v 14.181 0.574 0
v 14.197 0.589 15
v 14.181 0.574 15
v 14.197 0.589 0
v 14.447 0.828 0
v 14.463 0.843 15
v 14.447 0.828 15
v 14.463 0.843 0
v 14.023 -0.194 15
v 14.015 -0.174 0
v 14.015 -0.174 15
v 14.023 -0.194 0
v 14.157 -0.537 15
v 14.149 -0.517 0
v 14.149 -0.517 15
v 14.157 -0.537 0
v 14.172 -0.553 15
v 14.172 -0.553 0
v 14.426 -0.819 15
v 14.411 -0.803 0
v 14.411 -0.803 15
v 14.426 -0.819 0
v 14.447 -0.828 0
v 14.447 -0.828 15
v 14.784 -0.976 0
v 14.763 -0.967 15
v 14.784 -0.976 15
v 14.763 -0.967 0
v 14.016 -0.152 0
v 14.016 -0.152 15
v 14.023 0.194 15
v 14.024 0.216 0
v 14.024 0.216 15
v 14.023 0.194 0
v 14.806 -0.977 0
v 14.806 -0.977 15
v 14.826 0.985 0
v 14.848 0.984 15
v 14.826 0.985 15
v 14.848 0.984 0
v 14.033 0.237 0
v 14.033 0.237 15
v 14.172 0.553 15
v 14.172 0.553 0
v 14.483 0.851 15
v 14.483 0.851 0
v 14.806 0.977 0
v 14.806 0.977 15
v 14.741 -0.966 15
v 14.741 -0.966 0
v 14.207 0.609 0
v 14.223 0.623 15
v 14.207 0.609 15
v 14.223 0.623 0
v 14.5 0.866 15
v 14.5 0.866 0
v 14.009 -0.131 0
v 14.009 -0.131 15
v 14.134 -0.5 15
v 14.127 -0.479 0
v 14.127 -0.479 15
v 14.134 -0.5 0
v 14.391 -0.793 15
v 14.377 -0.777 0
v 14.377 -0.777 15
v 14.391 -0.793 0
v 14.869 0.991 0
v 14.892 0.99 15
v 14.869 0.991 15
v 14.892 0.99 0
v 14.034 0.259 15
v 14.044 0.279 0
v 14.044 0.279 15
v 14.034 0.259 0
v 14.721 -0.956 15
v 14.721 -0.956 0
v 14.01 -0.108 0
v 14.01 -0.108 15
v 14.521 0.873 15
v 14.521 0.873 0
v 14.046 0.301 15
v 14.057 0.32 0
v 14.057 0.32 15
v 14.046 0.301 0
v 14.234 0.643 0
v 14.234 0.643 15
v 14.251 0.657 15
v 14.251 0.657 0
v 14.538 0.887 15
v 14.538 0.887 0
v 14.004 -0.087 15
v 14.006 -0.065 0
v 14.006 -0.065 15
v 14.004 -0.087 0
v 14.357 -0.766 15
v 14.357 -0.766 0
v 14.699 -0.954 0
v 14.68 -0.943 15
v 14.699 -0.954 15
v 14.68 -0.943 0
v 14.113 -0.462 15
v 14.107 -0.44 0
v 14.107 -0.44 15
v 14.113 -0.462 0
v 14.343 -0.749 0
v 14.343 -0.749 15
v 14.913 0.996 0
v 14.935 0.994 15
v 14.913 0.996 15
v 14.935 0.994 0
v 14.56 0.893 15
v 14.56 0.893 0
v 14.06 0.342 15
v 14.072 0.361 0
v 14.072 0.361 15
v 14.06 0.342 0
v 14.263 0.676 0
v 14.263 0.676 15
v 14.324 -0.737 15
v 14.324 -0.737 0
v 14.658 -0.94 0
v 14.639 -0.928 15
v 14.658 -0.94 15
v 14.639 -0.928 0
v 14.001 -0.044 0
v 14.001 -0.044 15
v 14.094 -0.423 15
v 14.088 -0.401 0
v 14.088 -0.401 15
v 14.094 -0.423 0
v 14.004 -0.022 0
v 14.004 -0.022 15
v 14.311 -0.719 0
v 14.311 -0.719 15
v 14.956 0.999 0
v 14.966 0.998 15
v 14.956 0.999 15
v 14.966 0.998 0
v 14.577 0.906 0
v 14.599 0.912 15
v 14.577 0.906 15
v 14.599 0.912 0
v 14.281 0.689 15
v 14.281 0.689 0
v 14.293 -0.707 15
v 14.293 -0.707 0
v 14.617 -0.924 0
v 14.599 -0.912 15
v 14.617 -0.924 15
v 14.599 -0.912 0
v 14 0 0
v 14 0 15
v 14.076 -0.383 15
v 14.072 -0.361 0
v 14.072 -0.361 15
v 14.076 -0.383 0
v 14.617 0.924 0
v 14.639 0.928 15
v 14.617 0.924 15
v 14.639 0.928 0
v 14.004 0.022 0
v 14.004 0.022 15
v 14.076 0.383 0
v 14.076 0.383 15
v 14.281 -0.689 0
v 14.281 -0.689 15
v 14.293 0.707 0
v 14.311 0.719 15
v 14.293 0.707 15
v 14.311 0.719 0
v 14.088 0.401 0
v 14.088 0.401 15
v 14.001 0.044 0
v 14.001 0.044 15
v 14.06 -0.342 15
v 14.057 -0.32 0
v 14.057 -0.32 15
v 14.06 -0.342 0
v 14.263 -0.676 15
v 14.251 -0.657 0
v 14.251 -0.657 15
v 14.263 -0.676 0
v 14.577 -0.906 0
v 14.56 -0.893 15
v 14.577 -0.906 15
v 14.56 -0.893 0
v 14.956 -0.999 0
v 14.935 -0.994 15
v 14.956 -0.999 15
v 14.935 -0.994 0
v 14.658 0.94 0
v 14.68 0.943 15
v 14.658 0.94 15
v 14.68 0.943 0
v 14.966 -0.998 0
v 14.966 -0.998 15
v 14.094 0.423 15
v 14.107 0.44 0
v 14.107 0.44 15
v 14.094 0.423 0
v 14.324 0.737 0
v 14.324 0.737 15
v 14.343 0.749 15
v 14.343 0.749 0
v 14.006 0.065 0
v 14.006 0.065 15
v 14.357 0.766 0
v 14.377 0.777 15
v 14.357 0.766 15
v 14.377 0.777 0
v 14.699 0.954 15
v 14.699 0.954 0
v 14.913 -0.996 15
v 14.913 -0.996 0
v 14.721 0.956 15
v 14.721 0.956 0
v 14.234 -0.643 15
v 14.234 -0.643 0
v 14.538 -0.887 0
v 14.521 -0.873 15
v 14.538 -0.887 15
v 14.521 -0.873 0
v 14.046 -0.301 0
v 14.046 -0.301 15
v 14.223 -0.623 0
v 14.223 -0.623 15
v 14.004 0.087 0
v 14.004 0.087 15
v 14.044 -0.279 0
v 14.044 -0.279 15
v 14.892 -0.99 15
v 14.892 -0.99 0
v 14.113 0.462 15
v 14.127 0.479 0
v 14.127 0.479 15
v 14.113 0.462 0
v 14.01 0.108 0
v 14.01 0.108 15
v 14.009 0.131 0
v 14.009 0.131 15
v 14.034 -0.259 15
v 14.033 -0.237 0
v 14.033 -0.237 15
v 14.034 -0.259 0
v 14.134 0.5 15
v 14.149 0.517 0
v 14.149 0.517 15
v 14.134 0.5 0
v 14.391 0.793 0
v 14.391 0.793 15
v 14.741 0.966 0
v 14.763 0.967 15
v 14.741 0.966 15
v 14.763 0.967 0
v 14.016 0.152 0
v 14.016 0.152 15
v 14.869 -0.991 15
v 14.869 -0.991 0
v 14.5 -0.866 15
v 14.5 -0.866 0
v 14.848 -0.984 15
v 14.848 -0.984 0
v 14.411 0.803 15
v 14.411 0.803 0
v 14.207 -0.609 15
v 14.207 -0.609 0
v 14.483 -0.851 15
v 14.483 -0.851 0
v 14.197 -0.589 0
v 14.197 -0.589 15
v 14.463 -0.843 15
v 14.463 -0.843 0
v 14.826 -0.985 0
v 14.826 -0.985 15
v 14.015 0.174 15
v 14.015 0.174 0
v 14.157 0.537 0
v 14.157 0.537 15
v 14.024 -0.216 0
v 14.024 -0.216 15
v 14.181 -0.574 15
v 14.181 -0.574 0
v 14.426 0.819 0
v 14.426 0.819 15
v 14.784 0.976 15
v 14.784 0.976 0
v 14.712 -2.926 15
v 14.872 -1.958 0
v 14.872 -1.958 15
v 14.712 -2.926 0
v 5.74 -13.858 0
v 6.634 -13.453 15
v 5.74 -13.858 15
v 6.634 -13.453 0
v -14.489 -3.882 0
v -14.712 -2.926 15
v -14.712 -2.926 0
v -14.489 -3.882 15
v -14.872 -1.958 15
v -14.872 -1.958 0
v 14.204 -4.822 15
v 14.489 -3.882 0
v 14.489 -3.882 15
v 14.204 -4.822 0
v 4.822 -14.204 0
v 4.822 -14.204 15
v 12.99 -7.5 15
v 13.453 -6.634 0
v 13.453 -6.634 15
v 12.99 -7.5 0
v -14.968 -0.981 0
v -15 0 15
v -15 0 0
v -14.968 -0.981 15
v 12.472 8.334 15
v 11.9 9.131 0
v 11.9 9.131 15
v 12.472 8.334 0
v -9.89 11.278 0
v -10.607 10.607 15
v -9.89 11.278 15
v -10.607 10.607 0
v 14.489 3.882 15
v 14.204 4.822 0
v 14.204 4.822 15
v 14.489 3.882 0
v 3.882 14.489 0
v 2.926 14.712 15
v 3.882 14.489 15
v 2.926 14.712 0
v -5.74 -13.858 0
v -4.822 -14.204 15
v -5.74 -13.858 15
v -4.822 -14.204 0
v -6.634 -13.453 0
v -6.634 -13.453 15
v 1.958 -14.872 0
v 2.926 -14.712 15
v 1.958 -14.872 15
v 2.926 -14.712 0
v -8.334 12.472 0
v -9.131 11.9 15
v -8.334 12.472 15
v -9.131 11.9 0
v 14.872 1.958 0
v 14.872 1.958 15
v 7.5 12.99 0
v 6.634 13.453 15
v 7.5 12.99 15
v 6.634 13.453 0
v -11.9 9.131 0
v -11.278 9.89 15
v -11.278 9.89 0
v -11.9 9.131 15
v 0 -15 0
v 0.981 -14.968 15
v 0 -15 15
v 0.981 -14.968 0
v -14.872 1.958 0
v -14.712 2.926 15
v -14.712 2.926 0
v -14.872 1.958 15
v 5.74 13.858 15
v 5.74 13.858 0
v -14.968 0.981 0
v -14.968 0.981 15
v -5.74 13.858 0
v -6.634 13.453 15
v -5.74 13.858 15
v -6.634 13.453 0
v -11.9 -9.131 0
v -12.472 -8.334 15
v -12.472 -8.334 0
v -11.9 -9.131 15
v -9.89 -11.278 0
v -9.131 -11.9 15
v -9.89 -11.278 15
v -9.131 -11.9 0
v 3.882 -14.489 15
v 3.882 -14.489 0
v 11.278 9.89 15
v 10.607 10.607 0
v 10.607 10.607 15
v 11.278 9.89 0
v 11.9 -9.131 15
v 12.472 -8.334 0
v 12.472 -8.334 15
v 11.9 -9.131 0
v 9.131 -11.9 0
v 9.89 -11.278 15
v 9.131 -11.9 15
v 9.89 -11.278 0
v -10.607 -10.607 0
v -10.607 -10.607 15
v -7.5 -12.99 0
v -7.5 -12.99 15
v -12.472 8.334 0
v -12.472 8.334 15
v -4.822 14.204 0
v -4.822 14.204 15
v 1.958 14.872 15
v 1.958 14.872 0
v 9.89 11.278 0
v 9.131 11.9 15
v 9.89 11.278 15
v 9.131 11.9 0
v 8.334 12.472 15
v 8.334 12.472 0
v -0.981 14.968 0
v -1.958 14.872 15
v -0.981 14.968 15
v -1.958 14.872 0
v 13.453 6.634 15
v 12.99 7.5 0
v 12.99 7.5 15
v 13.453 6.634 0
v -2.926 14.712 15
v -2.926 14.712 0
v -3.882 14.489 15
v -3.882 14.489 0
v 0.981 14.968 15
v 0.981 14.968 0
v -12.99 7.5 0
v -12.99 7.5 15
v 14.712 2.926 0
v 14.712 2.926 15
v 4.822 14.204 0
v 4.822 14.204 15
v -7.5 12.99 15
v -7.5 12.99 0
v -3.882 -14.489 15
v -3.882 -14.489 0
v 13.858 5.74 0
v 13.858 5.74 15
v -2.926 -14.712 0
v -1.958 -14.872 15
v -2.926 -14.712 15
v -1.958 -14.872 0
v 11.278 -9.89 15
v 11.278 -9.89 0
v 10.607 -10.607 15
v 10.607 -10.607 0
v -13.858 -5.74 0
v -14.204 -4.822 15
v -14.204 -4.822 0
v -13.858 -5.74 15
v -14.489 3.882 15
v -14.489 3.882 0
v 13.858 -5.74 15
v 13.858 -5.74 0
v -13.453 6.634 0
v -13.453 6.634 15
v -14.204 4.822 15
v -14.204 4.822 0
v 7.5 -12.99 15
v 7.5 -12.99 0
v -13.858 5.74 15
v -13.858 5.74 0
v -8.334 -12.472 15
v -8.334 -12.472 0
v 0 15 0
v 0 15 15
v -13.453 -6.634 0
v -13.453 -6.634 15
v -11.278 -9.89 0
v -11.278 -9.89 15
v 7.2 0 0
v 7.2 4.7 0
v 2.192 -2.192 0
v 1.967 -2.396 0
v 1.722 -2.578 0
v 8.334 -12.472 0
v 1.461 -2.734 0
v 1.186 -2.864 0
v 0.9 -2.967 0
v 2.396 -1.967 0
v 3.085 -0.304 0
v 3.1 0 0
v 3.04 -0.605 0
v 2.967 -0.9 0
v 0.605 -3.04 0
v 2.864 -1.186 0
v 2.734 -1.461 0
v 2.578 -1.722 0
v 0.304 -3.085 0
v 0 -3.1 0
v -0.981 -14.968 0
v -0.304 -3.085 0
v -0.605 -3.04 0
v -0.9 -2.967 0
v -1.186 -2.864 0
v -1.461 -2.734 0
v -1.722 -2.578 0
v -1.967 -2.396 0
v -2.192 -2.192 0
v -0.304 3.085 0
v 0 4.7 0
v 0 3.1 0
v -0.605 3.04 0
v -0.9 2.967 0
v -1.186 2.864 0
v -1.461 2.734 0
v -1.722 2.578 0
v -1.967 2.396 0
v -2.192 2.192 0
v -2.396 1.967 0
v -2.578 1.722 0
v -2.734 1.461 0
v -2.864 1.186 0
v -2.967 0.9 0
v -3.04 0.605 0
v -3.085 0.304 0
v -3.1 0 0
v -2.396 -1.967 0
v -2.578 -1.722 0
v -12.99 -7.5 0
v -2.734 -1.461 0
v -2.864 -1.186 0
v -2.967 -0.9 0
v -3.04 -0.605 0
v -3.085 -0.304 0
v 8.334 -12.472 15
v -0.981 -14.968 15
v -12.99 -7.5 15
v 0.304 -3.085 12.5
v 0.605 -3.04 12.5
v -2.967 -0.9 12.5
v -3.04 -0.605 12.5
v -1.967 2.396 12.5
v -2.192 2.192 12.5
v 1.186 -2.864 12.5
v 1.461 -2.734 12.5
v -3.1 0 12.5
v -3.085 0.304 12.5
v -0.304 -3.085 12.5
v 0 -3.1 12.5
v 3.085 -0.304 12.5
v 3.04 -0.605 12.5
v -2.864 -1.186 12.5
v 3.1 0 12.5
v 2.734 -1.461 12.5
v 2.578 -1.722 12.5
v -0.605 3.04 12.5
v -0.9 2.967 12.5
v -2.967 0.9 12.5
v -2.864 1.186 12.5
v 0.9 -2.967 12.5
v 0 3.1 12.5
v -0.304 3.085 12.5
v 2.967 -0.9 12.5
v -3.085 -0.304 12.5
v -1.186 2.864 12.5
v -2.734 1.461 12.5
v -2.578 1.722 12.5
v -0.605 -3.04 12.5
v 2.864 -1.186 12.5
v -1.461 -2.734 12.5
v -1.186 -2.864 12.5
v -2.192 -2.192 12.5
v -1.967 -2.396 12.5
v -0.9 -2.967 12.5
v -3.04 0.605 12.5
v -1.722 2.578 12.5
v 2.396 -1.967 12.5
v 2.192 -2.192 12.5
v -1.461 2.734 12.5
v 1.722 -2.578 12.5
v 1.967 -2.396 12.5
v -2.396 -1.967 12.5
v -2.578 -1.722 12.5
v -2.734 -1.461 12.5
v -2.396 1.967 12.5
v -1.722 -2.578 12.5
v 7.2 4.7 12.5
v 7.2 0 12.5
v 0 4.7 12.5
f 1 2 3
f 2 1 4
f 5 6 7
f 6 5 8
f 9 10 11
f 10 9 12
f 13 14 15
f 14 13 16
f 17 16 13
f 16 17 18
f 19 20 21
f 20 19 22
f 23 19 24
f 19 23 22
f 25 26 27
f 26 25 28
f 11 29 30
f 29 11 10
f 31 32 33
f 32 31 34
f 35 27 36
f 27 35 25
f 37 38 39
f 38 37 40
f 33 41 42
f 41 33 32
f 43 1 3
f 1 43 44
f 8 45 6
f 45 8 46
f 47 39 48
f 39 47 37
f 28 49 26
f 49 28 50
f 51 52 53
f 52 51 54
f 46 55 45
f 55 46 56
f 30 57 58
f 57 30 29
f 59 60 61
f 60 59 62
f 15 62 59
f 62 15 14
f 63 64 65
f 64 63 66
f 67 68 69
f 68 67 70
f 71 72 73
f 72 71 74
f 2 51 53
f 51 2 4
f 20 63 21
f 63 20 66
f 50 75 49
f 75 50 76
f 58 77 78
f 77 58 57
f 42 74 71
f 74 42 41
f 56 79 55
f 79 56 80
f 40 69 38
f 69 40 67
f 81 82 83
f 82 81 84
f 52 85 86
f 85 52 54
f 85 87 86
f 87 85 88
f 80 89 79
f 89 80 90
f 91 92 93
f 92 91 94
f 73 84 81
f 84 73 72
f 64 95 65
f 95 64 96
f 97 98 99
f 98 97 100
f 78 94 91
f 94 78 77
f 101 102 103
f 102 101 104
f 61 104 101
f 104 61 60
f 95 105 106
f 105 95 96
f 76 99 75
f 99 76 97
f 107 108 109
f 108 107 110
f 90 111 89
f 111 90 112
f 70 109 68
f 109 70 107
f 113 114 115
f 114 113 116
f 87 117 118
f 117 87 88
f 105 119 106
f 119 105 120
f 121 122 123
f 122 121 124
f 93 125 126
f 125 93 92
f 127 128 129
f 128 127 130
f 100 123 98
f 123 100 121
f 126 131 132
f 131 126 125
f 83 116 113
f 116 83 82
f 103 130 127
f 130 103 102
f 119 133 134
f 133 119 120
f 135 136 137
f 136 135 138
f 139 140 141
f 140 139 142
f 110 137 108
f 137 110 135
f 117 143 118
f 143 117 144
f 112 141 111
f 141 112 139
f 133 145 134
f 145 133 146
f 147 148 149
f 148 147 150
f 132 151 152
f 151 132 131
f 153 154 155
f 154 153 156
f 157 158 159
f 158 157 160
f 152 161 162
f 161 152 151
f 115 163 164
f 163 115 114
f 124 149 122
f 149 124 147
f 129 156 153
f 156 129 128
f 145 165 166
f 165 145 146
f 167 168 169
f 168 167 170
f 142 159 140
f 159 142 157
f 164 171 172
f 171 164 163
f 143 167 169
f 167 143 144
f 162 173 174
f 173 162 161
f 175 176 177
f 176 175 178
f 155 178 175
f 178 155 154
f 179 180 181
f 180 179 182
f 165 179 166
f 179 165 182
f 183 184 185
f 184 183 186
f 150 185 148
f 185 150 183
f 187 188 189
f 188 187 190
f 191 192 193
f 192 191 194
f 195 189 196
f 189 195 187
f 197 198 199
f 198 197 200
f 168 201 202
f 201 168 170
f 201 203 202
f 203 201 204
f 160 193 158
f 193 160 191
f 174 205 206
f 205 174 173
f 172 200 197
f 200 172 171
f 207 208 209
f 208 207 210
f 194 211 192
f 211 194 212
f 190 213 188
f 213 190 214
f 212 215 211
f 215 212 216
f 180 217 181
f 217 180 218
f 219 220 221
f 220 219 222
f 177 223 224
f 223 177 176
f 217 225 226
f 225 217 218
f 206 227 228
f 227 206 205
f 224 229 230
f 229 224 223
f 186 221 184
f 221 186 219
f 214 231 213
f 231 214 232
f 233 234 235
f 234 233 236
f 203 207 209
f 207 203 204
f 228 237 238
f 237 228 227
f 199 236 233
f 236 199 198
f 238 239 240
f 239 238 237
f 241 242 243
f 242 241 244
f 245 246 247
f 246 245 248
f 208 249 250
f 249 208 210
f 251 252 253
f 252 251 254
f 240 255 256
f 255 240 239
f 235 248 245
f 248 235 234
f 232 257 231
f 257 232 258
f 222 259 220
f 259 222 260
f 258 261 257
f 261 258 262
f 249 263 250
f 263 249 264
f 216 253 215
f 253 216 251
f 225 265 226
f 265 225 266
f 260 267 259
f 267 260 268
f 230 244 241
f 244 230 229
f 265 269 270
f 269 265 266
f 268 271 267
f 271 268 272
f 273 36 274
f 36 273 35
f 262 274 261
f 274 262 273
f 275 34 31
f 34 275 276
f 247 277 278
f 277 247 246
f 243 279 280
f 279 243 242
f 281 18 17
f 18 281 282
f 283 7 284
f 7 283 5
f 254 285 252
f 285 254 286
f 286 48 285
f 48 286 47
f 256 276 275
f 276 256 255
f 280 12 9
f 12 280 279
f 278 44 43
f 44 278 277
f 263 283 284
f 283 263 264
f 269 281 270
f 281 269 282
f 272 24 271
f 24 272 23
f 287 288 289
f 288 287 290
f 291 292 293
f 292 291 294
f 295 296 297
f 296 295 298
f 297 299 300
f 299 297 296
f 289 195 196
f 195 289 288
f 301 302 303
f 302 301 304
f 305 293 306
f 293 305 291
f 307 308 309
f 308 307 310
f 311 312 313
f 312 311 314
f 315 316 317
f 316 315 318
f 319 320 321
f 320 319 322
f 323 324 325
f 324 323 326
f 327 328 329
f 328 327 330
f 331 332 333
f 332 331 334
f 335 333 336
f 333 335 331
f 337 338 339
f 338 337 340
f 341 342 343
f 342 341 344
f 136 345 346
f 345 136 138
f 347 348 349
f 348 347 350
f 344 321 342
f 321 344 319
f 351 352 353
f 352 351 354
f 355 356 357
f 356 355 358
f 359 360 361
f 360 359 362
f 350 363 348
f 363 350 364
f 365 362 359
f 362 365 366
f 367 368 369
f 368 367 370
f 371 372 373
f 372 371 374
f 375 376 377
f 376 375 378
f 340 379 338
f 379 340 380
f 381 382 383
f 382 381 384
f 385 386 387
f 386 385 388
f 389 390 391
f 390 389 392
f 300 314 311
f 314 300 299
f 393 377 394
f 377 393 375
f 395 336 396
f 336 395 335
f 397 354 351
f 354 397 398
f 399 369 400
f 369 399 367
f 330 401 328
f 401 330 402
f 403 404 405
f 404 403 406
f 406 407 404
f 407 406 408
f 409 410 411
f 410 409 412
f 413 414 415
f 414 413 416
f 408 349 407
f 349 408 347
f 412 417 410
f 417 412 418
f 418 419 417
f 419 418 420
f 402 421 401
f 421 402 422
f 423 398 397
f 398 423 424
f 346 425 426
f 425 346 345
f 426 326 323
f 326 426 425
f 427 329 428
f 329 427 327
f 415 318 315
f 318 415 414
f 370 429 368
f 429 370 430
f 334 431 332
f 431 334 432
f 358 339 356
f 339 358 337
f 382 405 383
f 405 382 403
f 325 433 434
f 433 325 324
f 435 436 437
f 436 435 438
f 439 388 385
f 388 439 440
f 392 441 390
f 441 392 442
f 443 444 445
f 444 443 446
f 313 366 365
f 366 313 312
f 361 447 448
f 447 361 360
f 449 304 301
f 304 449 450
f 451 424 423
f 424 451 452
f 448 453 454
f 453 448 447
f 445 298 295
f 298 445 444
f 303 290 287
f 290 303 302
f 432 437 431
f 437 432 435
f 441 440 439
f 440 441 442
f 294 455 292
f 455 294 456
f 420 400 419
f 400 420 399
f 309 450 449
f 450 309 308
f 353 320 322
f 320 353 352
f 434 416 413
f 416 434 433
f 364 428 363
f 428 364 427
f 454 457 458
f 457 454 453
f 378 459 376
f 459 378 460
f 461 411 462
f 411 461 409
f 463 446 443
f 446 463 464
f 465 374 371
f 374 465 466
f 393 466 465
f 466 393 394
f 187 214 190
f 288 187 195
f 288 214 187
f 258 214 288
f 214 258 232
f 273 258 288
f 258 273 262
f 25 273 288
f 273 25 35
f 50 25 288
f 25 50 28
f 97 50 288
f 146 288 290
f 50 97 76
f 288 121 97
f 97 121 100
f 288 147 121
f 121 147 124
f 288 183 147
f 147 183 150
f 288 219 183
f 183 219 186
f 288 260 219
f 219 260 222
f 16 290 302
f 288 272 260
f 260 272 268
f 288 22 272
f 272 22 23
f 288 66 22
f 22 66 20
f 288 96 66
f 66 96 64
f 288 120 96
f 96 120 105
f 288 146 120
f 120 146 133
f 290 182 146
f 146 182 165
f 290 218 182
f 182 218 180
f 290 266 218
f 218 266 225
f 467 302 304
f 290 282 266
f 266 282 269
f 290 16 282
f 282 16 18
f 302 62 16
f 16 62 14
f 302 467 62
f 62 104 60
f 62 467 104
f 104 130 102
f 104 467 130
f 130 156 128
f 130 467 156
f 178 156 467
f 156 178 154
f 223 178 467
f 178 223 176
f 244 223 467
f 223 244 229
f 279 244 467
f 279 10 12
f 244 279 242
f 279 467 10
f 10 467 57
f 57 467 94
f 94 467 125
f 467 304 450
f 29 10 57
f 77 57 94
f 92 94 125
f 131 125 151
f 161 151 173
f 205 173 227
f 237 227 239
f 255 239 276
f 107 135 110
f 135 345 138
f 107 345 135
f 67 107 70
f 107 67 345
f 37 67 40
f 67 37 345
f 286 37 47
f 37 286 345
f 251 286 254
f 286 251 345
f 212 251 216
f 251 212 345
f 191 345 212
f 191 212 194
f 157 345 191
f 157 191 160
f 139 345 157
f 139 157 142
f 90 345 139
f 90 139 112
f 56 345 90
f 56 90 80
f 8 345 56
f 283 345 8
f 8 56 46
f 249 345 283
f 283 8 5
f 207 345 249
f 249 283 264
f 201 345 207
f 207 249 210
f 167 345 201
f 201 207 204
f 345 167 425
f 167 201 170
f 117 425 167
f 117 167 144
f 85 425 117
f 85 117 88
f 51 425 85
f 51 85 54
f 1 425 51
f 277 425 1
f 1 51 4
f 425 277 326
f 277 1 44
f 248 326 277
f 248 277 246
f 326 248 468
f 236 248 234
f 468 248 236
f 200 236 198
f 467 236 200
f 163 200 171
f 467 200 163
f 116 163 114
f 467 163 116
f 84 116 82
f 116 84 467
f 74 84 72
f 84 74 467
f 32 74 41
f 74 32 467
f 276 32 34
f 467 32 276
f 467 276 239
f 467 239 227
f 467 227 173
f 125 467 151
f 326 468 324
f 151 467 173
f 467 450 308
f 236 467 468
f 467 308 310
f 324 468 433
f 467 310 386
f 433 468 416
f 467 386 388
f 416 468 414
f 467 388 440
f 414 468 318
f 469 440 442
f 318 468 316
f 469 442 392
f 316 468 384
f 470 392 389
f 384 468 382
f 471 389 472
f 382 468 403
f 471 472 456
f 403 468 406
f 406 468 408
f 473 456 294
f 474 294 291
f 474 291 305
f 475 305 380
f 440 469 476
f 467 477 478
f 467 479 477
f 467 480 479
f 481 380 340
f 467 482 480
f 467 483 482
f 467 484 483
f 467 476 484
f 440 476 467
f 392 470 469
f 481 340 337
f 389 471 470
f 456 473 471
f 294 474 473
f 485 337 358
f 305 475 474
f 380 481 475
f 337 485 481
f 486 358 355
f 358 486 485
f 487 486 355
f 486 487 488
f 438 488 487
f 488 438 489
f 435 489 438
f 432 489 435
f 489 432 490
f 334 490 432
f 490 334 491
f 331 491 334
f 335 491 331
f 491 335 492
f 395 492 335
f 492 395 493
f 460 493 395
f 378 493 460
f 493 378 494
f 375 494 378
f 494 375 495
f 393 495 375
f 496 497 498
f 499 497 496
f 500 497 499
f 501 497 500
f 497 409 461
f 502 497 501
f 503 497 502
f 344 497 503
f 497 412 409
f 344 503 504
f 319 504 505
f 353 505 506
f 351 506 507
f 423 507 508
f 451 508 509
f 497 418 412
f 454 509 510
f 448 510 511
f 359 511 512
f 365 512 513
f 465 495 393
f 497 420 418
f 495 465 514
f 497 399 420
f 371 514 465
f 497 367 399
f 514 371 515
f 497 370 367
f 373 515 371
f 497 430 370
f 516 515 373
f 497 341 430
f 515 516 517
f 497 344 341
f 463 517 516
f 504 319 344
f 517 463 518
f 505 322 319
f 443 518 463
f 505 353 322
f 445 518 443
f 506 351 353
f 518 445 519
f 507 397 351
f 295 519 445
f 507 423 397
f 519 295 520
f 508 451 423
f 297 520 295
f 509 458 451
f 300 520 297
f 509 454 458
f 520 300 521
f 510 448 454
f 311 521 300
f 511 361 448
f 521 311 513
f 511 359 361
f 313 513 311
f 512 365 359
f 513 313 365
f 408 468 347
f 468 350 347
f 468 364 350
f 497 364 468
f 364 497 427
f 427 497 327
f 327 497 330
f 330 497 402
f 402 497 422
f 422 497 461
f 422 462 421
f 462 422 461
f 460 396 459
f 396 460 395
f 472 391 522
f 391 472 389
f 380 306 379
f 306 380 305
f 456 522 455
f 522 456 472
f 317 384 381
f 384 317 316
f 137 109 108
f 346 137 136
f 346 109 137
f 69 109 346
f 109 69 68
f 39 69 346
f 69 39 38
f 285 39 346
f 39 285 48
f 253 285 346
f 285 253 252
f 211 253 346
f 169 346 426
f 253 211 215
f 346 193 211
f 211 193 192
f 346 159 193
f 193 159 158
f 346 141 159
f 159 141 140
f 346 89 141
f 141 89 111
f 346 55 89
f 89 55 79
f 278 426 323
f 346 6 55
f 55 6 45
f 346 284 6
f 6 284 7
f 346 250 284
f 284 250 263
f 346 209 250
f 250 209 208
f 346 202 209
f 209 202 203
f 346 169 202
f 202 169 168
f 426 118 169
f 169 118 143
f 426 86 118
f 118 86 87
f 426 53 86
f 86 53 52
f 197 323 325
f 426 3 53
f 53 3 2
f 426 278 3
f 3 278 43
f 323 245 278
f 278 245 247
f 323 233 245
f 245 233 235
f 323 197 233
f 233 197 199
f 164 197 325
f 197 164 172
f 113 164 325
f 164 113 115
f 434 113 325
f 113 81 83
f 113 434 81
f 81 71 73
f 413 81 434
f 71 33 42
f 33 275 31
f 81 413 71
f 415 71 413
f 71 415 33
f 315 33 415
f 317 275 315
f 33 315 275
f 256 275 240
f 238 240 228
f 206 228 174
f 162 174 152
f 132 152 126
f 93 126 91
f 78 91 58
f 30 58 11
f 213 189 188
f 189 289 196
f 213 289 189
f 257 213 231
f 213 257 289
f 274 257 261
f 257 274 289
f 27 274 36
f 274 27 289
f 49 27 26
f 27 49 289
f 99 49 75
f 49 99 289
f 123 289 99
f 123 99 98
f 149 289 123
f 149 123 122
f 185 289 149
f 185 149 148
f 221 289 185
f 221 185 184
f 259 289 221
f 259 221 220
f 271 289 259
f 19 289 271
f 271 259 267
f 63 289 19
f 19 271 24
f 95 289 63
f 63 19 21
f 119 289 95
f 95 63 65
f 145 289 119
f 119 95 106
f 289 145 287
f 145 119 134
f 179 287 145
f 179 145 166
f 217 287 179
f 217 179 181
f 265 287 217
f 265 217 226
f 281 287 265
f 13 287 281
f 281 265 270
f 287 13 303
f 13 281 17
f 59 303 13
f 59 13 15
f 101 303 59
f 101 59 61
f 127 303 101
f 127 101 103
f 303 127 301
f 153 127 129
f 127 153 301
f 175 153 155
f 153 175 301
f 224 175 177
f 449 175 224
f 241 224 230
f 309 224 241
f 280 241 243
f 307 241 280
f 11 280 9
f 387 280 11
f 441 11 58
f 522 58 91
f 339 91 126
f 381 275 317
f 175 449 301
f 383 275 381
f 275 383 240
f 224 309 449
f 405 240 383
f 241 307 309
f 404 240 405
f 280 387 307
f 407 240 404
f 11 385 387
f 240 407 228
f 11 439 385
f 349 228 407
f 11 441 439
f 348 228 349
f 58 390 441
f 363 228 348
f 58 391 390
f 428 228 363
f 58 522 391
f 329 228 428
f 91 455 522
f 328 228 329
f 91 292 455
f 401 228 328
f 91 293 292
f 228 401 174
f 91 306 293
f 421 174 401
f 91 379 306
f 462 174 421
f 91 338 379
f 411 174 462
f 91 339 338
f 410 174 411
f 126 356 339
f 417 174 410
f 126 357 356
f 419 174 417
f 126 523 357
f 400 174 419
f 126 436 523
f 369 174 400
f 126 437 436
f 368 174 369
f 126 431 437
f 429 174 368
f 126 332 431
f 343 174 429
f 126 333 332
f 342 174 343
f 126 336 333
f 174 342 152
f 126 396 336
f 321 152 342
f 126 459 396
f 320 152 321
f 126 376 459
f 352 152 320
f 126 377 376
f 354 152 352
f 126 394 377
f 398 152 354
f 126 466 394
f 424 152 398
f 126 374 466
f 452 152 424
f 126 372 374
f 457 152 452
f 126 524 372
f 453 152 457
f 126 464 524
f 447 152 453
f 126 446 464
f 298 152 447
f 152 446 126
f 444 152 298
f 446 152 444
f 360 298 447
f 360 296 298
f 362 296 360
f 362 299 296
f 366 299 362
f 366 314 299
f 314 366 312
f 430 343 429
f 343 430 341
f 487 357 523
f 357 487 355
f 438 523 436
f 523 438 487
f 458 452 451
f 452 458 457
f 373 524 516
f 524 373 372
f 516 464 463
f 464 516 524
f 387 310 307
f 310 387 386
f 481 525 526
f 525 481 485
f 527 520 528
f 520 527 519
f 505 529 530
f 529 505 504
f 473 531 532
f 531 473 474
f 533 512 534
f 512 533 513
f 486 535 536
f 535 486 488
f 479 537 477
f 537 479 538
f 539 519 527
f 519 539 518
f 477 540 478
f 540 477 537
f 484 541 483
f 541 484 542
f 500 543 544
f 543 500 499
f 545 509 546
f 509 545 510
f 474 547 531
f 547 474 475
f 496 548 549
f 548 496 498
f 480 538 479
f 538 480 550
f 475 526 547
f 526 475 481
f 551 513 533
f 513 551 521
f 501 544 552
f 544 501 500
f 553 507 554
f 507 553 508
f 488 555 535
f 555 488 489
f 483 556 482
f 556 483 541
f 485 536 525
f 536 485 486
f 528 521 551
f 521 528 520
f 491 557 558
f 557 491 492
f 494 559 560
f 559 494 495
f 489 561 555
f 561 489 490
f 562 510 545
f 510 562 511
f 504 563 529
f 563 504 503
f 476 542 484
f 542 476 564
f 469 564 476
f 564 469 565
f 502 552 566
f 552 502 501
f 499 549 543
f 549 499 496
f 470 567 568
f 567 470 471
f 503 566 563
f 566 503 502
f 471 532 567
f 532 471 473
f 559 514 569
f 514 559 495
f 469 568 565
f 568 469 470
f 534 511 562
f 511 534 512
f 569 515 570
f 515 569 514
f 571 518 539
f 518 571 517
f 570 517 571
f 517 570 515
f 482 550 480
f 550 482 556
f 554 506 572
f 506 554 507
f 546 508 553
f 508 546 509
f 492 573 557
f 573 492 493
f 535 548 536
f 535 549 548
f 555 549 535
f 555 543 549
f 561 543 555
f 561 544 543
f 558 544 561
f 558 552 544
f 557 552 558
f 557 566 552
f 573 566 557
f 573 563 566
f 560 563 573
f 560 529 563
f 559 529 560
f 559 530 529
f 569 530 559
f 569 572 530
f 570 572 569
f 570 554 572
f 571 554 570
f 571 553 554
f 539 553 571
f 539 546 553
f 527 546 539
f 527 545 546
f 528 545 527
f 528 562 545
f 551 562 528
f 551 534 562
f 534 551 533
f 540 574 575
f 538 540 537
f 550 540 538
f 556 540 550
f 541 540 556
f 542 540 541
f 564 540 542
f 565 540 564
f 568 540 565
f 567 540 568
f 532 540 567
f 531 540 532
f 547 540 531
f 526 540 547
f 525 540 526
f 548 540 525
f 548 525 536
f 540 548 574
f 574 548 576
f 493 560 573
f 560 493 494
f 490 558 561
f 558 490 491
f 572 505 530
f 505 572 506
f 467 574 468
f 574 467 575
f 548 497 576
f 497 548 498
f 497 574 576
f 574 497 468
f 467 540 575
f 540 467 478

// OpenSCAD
// Replacement knob for hotplate stirrer (D-shaft 6 mm)
// Print orientation: side facing hotplate down on bed (z = 0)

// ---------------- Parameters ----------------
knob_d        = 30;    // knob outer diameter
knob_h        = 15;    // knob height
bore_depth    = 12;    // D-bore depth from bottom face
shaft_d       = 6.2;   // D-shaft diameter
bore_flat     = 4.7;   // flat-to-opposite-side distance of D-bore
groove_count  = 18;    // number of vertical grip grooves
groove_d      = 2;     // groove diameter (half-cylinder)
pointer_w     = 1.5;   // pointer groove width
pointer_d     = 1;     // pointer groove depth
eps           = 0.5;   // cutter overshoot past faces

$fn = 96;

// ---------------- Model ----------------
difference() {
    // Main knob body
    cylinder(d = knob_d, h = knob_h);

    // D-shaped blind bore from bottom face
    translate([0, 0, -eps])
        cylinder(d = shaft_d, h = bore_depth + 2 * eps, $fn = 64);

    // Flat side of D-bore (cut into the bore to make a true D)
    translate([0, 0, -eps])
        cube([shaft_d + 2 * eps, bore_flat, bore_depth + 2 * eps]);

    // Vertical grip grooves around full height, centred on outer surface
    for (i = [0 : groove_count - 1]) {
        a = (i - (groove_count - 1) / 2) * 360 / groove_count;
        translate([knob_d / 2, 0, -eps])
            rotate([0, 0, a])
                cylinder(d = groove_d, h = knob_h + 2 * eps, $fn = 16);
    }

    // Pointer groove on top face, same side as D-bore flat
    translate([0, 0, knob_h - pointer_d])
        linear_extrude(height = pointer_d + eps)
            translate([0, 0, -eps])
                cylinder(d = pointer_w, h = knob_h + 2 * eps, $fn = 64);
}
